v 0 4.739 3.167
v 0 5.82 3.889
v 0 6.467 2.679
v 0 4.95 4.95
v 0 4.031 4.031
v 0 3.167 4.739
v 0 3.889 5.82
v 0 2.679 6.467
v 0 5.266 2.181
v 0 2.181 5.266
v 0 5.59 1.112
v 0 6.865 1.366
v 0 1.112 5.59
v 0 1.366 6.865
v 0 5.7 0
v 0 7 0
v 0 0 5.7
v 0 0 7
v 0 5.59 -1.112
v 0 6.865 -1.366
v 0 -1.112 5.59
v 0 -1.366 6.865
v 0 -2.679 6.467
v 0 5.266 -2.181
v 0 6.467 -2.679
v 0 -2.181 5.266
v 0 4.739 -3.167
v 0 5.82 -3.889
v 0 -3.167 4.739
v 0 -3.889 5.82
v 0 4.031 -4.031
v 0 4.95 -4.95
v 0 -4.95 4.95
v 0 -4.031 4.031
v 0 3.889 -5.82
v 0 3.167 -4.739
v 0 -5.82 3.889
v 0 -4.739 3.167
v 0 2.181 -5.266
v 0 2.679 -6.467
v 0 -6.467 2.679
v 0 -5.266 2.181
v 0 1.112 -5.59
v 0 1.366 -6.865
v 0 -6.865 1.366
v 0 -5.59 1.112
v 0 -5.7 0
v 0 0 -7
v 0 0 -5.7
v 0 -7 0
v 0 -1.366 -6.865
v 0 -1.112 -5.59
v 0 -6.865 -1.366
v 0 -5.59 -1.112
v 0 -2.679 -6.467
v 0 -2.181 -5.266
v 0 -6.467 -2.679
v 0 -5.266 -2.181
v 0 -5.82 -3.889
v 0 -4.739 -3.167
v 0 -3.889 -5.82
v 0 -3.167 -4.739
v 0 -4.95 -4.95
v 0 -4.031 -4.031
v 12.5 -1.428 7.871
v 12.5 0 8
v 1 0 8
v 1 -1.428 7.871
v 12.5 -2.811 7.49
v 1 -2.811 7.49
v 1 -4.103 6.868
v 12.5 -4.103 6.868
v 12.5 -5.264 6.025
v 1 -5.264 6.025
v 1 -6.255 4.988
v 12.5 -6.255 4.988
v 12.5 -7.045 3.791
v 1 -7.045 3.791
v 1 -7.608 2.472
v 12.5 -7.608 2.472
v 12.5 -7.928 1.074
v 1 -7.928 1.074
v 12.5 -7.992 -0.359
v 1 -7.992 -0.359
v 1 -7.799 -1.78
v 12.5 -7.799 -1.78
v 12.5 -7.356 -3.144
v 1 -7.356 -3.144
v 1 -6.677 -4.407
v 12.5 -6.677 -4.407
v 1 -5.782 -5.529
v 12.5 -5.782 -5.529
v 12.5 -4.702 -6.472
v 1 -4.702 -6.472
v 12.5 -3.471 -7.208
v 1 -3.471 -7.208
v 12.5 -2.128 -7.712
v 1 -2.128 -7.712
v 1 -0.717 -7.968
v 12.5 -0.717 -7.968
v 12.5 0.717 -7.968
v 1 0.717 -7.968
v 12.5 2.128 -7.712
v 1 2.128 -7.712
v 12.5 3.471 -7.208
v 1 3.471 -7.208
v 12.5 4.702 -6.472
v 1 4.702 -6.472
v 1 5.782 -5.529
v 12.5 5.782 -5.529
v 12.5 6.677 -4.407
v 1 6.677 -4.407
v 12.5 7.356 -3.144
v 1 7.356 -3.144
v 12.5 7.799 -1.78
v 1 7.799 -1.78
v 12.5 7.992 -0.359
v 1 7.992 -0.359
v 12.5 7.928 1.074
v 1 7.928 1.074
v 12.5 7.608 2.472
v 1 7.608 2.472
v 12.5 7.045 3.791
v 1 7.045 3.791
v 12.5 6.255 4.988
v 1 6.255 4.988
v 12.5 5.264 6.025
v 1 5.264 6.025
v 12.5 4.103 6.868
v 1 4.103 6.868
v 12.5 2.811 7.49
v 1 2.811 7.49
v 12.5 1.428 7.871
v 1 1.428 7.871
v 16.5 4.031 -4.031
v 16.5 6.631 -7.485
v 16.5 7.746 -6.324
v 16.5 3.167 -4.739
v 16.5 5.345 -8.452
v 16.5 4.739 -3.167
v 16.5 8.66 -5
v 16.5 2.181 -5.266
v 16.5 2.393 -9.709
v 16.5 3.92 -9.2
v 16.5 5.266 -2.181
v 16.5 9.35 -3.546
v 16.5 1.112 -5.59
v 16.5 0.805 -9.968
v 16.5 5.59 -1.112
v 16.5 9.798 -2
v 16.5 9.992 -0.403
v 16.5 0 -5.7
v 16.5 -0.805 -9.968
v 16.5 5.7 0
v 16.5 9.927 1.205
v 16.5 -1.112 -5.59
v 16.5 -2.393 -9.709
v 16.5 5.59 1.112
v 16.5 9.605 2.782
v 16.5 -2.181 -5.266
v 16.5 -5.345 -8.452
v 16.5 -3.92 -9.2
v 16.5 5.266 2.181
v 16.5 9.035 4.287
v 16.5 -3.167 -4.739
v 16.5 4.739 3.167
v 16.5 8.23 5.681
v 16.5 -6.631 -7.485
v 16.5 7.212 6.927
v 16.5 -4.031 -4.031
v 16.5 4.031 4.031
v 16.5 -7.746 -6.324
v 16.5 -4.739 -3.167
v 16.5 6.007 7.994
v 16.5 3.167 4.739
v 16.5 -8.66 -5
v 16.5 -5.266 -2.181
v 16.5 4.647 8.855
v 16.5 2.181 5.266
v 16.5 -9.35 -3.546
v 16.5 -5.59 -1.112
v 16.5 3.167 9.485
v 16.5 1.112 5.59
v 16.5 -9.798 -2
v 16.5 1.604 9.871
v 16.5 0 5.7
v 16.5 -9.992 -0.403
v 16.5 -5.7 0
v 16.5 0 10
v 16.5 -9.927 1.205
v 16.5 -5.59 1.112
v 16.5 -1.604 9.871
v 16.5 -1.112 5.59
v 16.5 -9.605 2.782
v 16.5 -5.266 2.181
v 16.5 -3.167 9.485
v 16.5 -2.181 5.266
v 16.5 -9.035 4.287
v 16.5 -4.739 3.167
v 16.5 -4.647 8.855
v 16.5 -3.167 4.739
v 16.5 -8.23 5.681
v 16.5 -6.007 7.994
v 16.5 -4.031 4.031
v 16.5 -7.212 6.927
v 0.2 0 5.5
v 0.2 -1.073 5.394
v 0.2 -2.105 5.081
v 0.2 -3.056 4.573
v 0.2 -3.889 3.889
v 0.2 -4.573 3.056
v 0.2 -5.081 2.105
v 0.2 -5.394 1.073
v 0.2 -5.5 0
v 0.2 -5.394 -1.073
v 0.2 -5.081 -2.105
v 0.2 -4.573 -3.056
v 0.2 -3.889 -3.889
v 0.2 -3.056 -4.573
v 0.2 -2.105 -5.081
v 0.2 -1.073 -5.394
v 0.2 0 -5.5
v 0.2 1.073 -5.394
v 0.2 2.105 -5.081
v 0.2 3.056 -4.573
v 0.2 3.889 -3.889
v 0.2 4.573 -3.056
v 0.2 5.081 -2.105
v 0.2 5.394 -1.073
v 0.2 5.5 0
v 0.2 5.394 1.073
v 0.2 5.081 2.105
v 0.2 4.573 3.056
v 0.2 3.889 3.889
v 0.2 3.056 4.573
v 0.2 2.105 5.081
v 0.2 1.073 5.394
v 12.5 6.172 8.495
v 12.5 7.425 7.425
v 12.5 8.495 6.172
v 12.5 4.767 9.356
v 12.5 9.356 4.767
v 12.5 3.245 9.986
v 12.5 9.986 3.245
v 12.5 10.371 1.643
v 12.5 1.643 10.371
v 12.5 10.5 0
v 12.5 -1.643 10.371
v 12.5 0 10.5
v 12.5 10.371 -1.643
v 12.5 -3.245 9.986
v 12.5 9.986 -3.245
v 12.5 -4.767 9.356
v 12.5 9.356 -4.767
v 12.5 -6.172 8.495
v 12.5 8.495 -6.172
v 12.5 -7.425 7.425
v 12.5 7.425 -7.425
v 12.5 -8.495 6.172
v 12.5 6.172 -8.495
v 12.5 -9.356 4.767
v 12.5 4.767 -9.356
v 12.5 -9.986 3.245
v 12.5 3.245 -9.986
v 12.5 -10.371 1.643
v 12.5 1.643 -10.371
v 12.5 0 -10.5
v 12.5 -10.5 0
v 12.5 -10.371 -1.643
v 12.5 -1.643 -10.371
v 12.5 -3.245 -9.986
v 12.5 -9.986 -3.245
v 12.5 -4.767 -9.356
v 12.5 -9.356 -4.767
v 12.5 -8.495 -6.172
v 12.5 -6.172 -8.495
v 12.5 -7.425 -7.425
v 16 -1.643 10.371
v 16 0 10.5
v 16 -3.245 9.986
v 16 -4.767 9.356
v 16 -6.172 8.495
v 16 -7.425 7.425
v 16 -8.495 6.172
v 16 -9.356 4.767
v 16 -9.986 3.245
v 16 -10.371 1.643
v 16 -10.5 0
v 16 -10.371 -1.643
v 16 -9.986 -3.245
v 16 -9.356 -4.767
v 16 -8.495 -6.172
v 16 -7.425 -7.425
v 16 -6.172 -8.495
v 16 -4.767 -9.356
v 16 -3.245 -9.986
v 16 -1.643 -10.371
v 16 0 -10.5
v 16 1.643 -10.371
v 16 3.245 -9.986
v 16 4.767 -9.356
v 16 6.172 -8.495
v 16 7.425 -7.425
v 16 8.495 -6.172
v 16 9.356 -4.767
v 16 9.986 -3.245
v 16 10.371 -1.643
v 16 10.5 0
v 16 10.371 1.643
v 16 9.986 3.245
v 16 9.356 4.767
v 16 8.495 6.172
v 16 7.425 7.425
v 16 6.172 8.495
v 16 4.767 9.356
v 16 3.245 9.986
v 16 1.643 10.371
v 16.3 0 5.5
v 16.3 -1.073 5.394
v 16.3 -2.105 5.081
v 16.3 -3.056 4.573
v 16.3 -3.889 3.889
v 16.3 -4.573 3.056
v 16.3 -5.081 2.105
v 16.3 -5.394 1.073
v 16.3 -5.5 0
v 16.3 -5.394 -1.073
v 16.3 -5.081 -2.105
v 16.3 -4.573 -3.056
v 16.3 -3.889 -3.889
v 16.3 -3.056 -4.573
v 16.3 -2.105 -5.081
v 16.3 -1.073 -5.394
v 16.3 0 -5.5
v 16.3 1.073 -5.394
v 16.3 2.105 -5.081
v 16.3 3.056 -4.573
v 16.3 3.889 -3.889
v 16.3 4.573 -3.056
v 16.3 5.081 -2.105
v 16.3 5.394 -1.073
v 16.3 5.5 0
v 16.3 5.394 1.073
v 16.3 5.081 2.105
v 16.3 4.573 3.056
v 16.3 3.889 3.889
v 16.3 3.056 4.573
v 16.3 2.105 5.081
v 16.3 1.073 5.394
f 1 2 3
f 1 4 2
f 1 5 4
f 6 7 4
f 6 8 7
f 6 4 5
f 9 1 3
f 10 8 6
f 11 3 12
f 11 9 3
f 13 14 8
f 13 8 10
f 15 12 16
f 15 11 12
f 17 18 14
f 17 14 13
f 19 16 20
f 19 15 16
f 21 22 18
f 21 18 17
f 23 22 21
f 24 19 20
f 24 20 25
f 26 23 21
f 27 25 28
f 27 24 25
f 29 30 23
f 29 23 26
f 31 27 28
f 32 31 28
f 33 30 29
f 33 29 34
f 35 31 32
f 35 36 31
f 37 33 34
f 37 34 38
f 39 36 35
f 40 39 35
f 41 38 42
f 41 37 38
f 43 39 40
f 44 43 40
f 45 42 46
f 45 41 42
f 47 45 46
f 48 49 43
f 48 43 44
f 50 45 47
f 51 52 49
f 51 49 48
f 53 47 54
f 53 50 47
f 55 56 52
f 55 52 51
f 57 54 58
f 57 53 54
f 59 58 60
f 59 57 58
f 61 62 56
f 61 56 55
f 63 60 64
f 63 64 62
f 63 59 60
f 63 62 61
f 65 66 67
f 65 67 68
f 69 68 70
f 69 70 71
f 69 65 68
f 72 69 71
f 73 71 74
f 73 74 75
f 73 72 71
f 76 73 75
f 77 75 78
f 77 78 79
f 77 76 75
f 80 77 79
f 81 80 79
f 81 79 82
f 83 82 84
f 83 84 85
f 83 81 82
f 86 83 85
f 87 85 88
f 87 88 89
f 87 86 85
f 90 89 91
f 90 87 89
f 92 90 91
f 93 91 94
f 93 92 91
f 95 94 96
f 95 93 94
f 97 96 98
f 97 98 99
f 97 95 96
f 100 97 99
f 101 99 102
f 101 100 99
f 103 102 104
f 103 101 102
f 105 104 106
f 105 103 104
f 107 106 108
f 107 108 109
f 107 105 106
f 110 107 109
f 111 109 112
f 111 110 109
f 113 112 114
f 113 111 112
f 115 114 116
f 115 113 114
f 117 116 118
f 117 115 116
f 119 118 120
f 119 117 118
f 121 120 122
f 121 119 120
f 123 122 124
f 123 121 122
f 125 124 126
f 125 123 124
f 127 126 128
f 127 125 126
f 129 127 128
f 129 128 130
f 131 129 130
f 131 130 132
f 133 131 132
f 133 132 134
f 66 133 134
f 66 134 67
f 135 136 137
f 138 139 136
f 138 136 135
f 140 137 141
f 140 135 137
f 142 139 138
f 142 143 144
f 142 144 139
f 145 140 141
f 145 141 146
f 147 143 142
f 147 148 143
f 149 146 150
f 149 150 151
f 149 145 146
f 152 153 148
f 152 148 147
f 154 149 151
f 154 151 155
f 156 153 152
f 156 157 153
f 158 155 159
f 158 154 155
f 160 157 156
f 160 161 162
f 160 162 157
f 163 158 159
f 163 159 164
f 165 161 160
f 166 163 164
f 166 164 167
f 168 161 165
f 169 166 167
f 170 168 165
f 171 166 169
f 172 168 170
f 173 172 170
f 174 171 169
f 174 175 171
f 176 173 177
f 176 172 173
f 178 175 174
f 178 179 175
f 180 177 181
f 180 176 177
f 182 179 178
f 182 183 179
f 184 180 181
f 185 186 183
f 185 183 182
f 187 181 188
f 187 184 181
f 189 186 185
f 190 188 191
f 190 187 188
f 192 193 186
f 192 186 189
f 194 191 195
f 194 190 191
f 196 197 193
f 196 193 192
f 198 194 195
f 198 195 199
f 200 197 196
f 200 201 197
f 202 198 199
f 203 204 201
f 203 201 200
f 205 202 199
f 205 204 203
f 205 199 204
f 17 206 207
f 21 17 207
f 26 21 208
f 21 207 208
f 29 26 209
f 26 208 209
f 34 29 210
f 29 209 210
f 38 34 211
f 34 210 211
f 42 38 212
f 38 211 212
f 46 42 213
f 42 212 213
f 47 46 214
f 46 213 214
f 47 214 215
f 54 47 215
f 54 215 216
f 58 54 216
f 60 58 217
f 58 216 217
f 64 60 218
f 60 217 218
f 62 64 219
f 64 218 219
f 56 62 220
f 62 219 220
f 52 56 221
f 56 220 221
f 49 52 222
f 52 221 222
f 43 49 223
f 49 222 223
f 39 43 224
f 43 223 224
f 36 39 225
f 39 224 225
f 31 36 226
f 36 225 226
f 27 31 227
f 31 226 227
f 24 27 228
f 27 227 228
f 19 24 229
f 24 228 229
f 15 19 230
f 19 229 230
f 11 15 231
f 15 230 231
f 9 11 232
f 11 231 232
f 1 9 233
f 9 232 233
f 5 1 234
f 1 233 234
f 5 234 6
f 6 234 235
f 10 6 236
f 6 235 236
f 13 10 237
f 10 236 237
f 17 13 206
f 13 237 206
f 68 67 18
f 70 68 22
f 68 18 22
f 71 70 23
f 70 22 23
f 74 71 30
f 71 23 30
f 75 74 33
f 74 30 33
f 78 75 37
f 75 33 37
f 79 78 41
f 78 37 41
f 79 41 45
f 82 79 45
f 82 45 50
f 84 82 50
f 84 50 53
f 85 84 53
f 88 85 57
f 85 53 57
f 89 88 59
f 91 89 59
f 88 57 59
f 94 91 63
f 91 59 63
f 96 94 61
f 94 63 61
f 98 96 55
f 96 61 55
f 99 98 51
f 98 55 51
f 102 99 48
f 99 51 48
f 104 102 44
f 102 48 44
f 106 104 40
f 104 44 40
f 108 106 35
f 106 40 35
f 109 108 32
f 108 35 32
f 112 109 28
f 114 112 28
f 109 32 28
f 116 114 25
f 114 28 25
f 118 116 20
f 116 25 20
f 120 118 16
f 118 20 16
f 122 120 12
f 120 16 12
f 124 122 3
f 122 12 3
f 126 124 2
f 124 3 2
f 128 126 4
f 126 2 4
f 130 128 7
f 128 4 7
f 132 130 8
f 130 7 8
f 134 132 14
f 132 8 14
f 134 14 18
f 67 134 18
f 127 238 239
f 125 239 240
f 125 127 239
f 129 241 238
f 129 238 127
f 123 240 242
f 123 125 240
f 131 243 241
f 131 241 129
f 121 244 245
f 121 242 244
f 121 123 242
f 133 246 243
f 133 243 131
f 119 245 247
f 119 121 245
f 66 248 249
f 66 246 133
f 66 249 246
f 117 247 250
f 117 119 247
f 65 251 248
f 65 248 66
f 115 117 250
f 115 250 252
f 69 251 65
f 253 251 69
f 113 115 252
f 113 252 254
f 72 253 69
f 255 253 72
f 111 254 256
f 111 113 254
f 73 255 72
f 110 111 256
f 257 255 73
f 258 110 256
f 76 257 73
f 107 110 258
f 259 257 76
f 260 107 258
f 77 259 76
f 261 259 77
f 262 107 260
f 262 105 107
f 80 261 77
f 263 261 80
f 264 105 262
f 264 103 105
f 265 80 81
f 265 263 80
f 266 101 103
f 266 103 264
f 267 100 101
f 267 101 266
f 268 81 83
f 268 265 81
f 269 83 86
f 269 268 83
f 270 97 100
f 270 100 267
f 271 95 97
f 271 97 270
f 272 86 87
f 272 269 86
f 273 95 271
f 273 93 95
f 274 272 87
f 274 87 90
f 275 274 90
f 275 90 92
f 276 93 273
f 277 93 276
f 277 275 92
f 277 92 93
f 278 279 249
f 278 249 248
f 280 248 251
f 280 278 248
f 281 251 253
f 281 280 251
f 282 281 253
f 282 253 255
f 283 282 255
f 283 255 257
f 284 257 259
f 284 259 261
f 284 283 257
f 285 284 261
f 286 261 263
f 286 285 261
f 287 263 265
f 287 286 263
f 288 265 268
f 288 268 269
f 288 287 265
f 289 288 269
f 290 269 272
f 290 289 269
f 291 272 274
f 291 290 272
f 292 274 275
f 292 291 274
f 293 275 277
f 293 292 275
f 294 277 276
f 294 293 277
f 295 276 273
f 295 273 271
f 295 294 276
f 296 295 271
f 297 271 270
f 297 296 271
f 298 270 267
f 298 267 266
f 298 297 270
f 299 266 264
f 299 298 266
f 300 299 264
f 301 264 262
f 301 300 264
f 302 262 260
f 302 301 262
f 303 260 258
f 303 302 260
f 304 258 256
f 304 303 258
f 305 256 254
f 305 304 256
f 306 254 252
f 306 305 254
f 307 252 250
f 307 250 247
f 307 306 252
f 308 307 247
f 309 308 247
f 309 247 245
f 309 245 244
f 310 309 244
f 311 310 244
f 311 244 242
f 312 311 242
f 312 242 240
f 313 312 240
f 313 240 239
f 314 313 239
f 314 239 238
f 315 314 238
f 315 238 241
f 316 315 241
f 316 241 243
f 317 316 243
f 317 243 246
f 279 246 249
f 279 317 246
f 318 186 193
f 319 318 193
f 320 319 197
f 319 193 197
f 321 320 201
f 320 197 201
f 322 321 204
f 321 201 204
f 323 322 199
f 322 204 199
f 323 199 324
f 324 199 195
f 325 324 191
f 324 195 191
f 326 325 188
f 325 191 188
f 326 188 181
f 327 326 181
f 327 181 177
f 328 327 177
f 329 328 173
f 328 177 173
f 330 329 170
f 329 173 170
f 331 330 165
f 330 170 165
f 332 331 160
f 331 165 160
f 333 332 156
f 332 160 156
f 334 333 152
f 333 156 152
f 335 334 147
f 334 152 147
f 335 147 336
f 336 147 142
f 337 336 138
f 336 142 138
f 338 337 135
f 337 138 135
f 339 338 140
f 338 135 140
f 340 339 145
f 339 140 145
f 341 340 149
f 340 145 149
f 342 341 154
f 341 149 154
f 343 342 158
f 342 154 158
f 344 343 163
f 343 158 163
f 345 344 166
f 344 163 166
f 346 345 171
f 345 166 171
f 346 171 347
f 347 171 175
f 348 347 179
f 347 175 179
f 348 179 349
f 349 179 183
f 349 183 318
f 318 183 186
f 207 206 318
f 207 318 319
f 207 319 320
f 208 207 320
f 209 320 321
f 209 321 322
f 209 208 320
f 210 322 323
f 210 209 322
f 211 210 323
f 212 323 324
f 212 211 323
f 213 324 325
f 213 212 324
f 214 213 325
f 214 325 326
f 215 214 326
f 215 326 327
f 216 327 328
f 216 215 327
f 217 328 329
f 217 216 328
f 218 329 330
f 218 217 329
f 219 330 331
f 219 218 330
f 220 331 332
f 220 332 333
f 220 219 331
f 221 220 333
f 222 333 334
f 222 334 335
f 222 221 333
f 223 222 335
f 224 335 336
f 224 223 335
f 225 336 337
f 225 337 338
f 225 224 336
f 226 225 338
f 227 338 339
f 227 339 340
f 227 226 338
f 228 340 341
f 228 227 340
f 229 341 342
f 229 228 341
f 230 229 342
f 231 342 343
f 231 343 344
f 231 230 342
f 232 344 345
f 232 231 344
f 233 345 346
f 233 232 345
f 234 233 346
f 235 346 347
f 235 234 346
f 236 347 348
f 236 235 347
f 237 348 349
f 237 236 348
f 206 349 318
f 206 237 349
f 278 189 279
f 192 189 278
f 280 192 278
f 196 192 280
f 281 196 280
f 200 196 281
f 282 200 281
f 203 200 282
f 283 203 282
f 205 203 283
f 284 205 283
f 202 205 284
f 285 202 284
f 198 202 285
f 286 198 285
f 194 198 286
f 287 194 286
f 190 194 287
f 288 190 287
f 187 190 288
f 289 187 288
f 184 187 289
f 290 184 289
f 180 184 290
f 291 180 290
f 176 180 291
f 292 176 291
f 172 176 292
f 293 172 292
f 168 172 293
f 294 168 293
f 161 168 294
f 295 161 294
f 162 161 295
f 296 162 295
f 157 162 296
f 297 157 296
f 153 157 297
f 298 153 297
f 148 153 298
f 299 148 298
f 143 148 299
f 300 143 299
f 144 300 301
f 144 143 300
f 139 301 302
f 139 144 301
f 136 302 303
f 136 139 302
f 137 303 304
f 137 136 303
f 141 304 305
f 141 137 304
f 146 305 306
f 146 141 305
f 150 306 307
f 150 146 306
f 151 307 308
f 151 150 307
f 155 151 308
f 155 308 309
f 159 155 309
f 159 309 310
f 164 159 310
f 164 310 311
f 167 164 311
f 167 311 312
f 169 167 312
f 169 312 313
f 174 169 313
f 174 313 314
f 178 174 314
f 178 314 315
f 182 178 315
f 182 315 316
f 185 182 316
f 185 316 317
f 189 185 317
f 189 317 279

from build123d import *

# Parameters (mm, degrees)
CHANFREIN1_SIZE = 0.5
CHANFREIN2_SIZE = 1
CHANFREIN3_SIZE = 0.2


with BuildPart() as part:
    # Esquisse1 → Base-Révolution (revolve)
    with BuildSketch(Plane.XY, mode=Mode.PRIVATE) as base_r_volution_sk:
        Polygon((12.5, 10.5), (16.5, 10.5), (16.5, 5.5), (0, 5.5), (0, 8), (12.5, 8), align=None)
    revolve(base_r_volution_sk.sketch.rotate(Axis((11.390827922, 0, 0), (1, 0, 0)), 90), axis=Axis((11.390827922, 0, 0), (1, 0, 0)))

    # Chanfrein1
    chanfrein1_edges = [part.edges().sort_by_distance(p)[0] for p in [
        (16.5, 0, -10.5),
    ]]
    chamfer(chanfrein1_edges, length=CHANFREIN1_SIZE)

    # Chanfrein2
    chanfrein2_edges = [part.edges().sort_by_distance(p)[0] for p in [
        (0, 0, -8),
    ]]
    chamfer(chanfrein2_edges, length=CHANFREIN2_SIZE)

    # Chanfrein3
    chanfrein3_edges = [part.edges().sort_by_distance(p)[0] for p in [
        (0, 0, -5.5),
        (16.5, 0, -5.5),
    ]]
    chamfer(chanfrein3_edges, length=CHANFREIN3_SIZE)


solid = part.part
